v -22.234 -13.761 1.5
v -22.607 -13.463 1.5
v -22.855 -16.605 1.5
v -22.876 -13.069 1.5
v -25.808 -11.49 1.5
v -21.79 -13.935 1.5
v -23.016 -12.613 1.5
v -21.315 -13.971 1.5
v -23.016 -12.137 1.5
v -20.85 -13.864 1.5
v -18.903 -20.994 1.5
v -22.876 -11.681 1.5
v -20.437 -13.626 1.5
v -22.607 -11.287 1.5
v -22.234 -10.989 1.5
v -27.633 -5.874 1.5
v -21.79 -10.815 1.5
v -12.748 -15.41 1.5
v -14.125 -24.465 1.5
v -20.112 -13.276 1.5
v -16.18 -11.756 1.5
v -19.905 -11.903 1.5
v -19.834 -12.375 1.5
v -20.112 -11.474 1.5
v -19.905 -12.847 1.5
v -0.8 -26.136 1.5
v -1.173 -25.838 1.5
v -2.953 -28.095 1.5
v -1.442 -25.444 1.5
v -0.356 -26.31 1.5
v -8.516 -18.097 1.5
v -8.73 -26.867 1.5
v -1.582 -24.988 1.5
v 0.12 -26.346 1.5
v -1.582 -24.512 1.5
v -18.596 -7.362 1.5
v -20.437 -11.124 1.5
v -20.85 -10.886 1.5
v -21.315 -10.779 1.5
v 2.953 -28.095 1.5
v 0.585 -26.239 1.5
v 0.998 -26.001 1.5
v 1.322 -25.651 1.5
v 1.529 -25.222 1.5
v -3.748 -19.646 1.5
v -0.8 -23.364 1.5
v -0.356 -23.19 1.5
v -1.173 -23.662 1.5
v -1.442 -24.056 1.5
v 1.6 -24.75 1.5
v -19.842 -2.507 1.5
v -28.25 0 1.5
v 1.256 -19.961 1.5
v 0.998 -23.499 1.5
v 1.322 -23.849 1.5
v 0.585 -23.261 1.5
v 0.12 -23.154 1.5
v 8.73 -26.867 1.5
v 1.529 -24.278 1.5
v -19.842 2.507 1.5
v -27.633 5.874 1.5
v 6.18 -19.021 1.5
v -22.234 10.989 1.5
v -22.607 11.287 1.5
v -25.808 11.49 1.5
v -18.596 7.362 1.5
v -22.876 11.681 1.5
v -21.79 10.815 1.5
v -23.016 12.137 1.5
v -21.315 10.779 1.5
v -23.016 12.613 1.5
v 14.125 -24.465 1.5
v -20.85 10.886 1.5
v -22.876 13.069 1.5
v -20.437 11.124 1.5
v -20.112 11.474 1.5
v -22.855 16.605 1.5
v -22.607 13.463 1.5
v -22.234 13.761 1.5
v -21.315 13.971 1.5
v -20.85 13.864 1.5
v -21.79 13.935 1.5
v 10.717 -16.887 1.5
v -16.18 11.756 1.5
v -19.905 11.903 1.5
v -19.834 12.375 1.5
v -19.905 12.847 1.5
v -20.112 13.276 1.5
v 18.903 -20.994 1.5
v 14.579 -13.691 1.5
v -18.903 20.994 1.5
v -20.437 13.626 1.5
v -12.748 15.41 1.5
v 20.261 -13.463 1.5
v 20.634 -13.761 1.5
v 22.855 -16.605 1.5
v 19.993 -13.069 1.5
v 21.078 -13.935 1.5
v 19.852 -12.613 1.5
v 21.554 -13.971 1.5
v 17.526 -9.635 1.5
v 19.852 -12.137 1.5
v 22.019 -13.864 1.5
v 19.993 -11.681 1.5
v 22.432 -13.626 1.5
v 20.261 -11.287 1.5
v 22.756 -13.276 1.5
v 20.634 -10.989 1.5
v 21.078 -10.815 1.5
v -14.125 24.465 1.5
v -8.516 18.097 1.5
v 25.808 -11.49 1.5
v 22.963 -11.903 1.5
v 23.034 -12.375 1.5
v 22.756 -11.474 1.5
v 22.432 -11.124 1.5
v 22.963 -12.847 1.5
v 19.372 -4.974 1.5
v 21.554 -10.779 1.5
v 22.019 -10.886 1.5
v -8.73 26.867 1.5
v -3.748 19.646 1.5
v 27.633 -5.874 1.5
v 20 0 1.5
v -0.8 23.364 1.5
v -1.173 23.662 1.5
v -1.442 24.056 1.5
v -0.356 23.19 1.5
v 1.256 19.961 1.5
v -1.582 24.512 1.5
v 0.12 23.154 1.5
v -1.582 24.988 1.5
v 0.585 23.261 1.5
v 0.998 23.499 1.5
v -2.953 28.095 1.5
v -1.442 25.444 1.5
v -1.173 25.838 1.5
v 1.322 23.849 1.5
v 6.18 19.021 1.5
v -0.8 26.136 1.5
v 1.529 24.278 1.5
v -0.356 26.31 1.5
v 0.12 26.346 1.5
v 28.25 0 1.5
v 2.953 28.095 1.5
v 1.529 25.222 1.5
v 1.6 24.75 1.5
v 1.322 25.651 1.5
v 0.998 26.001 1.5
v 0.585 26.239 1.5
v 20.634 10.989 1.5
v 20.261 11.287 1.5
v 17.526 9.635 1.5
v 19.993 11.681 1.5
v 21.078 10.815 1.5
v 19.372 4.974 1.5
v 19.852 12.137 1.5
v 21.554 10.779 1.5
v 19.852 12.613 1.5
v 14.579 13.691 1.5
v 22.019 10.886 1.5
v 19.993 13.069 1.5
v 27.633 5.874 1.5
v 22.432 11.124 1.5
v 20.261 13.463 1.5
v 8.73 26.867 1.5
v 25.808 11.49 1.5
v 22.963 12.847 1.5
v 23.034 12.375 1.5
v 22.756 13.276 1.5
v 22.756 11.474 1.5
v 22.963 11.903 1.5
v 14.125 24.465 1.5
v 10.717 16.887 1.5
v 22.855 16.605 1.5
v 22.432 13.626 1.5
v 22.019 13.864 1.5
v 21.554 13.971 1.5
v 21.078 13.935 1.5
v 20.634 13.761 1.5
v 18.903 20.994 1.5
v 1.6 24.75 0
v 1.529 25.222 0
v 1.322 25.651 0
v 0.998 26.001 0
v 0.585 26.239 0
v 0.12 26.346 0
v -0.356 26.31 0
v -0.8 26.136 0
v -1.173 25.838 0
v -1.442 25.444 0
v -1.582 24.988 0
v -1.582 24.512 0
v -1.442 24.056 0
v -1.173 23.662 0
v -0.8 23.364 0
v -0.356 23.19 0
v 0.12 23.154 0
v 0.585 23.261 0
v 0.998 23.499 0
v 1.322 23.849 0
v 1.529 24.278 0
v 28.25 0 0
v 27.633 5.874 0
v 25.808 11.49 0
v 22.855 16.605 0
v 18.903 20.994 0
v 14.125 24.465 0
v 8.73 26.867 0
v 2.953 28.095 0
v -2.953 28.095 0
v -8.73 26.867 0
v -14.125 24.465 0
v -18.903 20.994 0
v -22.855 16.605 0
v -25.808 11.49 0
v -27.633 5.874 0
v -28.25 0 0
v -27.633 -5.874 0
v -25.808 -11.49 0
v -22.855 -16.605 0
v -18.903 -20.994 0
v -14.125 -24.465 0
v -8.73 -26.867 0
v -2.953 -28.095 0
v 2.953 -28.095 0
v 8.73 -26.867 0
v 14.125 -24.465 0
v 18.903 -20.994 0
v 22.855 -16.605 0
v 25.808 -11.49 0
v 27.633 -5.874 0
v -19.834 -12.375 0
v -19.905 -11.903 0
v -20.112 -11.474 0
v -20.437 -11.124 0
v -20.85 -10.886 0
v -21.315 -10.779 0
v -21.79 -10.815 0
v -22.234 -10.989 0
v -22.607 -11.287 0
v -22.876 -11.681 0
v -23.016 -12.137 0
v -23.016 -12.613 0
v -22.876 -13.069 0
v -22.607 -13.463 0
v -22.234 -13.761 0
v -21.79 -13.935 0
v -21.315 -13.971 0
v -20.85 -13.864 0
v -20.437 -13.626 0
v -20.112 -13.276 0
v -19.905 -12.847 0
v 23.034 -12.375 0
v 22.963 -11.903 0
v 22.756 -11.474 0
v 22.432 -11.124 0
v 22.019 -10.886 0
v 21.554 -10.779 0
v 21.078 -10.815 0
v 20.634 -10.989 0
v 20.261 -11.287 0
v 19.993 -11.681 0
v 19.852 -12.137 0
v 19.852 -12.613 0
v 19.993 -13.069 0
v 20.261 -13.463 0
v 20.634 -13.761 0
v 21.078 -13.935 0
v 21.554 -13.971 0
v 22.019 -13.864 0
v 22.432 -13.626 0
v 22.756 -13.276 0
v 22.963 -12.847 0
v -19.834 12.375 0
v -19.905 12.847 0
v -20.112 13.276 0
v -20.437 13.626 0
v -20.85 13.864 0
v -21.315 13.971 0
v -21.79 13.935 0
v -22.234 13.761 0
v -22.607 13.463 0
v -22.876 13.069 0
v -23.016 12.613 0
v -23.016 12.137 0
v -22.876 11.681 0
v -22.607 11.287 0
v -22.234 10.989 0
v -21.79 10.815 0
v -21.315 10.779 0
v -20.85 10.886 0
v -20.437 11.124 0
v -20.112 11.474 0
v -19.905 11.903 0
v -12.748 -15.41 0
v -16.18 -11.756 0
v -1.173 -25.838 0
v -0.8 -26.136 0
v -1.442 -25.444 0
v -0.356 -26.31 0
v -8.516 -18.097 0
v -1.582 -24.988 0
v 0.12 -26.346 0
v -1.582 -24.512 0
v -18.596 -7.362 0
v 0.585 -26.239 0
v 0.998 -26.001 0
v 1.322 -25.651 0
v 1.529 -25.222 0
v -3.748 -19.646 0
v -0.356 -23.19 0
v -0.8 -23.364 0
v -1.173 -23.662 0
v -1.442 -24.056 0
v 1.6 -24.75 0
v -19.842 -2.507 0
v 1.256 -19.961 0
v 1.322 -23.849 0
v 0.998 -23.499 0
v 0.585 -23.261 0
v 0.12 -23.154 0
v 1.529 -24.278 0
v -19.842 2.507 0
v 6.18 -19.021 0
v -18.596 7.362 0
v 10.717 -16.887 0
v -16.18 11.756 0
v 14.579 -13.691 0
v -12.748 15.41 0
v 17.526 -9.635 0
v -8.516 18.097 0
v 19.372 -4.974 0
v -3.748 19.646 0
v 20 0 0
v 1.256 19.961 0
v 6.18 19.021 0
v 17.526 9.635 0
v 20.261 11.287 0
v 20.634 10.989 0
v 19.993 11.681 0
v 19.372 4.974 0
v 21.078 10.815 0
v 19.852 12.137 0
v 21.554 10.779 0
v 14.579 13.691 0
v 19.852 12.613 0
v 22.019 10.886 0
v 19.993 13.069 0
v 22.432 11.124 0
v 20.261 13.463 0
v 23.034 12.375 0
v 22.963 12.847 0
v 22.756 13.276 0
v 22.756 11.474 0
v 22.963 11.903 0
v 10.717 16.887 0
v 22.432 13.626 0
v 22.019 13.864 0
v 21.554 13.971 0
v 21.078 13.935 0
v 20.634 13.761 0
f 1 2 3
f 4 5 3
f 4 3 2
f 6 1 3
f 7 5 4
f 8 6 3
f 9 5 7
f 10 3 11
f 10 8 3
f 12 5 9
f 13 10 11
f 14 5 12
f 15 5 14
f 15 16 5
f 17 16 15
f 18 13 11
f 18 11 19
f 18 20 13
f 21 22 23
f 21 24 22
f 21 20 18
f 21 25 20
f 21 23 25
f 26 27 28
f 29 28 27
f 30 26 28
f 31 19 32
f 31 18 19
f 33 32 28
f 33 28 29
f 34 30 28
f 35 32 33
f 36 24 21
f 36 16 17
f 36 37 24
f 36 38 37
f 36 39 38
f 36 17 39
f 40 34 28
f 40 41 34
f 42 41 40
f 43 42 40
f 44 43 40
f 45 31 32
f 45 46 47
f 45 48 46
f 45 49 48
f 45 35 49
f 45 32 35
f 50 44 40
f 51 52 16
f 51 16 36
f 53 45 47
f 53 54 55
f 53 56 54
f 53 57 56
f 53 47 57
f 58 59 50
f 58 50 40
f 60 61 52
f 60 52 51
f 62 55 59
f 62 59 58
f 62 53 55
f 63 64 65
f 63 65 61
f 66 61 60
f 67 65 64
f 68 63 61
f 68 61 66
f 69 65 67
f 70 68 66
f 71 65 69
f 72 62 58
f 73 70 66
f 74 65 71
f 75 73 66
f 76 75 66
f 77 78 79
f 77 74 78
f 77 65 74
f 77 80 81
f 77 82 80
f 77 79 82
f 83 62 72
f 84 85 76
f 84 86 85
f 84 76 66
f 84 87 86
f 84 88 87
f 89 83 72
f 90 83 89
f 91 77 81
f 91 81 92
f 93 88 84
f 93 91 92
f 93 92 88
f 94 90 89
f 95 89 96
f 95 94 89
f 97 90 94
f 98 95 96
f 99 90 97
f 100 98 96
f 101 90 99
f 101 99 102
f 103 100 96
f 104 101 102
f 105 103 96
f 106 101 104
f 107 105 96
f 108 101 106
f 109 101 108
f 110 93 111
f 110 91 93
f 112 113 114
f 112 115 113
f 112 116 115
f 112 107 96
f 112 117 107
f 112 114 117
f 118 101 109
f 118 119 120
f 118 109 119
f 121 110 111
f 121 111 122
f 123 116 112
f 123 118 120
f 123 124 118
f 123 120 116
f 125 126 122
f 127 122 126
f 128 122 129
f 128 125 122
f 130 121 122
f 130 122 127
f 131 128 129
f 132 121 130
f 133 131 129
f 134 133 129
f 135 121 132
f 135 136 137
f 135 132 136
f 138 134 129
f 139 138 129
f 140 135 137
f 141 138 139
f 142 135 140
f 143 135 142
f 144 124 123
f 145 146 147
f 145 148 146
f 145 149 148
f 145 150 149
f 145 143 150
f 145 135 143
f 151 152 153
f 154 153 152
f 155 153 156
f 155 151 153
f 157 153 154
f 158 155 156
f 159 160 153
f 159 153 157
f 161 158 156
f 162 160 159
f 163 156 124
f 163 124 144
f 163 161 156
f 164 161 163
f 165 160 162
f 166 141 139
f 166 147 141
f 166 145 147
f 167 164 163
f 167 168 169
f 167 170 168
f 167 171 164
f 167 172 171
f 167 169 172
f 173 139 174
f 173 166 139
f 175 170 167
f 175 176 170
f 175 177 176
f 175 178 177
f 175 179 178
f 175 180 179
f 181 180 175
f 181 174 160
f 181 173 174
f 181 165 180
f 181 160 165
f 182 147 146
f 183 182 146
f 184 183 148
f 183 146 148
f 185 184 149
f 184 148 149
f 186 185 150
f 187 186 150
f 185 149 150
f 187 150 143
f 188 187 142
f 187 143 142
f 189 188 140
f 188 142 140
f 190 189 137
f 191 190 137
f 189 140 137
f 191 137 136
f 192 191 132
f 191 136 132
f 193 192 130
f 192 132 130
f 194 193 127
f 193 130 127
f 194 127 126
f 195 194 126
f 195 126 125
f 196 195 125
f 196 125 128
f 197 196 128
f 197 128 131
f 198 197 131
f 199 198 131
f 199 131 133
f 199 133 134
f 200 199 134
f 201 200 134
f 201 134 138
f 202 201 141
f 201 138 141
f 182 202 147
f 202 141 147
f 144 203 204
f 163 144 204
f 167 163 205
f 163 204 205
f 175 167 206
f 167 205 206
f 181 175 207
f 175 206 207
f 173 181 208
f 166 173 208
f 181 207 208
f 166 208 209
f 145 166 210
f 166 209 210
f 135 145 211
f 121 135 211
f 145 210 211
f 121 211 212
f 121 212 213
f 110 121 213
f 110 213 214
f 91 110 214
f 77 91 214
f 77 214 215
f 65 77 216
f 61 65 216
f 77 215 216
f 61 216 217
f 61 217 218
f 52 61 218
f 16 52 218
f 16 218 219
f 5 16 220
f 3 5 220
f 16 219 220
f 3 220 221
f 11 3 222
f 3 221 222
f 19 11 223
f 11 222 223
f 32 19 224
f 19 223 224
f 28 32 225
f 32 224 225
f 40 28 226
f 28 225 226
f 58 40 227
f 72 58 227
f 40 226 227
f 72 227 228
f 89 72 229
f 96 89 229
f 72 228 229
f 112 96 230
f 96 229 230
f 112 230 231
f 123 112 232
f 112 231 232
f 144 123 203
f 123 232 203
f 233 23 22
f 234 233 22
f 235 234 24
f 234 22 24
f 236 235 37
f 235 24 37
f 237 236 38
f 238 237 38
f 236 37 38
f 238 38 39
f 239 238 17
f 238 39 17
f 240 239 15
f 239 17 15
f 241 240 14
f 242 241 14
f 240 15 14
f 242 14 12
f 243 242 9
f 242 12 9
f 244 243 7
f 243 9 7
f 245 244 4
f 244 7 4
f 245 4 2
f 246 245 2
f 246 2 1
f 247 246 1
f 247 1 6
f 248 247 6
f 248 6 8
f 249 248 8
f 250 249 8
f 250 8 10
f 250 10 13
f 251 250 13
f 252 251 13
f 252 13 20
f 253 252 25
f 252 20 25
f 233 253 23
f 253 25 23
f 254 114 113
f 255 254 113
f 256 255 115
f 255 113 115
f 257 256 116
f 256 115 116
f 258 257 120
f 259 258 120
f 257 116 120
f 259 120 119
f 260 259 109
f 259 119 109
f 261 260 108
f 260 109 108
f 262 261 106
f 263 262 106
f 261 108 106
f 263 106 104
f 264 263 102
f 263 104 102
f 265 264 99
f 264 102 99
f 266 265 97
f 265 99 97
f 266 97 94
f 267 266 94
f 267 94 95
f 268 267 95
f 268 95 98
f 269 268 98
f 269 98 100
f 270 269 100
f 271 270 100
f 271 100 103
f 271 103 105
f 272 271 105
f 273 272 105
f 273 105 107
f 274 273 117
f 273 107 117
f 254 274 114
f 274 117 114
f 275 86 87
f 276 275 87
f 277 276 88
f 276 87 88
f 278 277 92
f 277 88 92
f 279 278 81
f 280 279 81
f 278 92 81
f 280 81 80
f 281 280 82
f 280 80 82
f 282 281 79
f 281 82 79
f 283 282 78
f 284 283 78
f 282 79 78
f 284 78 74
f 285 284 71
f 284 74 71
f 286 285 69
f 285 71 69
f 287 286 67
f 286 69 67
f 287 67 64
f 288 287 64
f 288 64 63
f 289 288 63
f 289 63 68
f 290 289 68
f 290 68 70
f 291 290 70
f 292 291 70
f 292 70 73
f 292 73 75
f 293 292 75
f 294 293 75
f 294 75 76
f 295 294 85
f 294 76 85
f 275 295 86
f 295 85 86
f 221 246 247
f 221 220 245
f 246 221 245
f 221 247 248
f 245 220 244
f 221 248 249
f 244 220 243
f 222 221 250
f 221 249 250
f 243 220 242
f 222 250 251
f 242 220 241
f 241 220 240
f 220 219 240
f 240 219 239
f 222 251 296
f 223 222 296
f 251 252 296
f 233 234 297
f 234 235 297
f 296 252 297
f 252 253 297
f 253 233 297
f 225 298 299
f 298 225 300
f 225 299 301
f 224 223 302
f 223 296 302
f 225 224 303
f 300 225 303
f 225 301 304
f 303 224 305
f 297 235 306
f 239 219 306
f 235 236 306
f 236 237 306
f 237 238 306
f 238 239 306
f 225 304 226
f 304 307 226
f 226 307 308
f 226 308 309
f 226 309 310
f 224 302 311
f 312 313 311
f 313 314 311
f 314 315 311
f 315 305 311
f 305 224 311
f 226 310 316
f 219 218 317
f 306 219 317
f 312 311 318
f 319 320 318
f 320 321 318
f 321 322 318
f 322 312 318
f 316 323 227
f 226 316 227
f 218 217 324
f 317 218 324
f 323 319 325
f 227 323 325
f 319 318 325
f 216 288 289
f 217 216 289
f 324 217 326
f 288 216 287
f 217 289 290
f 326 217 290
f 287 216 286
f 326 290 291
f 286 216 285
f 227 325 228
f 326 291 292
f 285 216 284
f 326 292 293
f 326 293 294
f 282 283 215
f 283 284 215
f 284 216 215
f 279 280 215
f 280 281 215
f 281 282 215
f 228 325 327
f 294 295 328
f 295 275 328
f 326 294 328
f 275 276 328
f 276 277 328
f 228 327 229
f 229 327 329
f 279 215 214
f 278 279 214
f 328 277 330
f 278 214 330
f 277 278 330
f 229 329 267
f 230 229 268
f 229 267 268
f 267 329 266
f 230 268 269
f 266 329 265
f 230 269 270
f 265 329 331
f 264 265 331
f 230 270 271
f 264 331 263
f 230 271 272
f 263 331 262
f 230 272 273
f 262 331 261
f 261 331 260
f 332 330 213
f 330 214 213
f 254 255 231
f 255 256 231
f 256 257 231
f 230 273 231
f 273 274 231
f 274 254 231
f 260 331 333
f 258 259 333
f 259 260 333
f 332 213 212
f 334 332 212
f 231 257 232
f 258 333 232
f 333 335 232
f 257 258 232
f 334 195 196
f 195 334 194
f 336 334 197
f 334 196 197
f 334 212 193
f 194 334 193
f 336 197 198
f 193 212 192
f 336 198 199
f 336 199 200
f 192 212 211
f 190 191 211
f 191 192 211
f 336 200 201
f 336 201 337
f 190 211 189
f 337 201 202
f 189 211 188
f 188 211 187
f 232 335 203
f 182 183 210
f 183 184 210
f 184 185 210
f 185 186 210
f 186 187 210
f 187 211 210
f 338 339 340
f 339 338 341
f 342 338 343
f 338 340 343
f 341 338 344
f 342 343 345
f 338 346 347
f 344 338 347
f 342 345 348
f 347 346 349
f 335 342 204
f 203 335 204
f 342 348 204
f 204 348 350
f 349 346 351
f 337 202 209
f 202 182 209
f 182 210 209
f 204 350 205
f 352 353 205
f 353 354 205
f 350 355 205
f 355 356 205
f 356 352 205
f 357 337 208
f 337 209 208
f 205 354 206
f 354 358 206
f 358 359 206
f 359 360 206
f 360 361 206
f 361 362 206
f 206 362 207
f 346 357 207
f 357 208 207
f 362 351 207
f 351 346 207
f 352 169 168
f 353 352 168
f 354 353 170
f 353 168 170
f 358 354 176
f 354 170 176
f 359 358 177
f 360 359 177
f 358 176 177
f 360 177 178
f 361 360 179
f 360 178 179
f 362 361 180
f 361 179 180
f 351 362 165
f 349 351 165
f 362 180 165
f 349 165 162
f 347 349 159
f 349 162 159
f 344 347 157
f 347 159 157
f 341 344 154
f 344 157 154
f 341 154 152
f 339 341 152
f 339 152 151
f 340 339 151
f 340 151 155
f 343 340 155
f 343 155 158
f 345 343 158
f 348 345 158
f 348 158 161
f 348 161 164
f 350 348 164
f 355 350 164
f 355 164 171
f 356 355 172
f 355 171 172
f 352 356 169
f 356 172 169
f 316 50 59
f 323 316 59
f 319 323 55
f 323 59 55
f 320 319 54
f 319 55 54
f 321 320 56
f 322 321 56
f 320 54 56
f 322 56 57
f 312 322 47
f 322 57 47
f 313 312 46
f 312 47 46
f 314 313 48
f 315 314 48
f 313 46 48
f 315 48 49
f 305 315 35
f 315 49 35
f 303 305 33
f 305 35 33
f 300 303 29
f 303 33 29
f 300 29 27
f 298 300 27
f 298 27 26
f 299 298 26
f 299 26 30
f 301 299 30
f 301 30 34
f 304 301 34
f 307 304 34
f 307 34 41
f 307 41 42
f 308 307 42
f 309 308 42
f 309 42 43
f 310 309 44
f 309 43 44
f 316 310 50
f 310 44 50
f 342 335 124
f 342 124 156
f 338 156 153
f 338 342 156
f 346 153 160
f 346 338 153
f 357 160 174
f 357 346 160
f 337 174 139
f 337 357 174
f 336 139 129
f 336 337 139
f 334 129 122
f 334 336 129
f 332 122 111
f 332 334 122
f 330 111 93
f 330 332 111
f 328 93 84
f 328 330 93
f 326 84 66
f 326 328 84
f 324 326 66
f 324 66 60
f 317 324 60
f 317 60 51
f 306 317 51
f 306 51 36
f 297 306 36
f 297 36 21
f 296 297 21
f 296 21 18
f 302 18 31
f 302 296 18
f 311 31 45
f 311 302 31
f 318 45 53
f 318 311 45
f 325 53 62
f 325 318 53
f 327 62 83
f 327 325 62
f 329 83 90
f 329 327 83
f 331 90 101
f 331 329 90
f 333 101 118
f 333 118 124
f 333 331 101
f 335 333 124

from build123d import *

# Parameters (mm, degrees)
SKETCH_1_R          = 28.25
SKETCH_1_R_2        = 20
EXTRUDE_1_DEPTH     = 1.5
SKETCH_2_R          = 1.6
CUT_EXTRUDE_1_DEPTH = 1.5


with BuildPart() as part:
    # 草图1 → 凸台-拉伸1 (new body)
    with BuildSketch(Plane.XY):
        Circle(SKETCH_1_R)
        Circle(SKETCH_1_R_2, mode=Mode.SUBTRACT)
    extrude(amount=EXTRUDE_1_DEPTH)

    # 草图2 → 切除-拉伸1 (cut)
    with BuildSketch(Plane.XY.offset(1.5)):
        with Locations((0, 24.75)):
            Circle(SKETCH_2_R)
        with Locations((21.434128744, 12.375)):
            Circle(SKETCH_2_R)
        with Locations((21.434128744, -12.375)):
            Circle(SKETCH_2_R)
        with Locations((0, -24.75)):
            Circle(SKETCH_2_R)
        with Locations((-21.434128744, -12.375)):
            Circle(SKETCH_2_R)
        with Locations((-21.434128744, 12.375)):
            Circle(SKETCH_2_R)
    extrude(amount=-CUT_EXTRUDE_1_DEPTH, mode=Mode.SUBTRACT)


solid = part.part
